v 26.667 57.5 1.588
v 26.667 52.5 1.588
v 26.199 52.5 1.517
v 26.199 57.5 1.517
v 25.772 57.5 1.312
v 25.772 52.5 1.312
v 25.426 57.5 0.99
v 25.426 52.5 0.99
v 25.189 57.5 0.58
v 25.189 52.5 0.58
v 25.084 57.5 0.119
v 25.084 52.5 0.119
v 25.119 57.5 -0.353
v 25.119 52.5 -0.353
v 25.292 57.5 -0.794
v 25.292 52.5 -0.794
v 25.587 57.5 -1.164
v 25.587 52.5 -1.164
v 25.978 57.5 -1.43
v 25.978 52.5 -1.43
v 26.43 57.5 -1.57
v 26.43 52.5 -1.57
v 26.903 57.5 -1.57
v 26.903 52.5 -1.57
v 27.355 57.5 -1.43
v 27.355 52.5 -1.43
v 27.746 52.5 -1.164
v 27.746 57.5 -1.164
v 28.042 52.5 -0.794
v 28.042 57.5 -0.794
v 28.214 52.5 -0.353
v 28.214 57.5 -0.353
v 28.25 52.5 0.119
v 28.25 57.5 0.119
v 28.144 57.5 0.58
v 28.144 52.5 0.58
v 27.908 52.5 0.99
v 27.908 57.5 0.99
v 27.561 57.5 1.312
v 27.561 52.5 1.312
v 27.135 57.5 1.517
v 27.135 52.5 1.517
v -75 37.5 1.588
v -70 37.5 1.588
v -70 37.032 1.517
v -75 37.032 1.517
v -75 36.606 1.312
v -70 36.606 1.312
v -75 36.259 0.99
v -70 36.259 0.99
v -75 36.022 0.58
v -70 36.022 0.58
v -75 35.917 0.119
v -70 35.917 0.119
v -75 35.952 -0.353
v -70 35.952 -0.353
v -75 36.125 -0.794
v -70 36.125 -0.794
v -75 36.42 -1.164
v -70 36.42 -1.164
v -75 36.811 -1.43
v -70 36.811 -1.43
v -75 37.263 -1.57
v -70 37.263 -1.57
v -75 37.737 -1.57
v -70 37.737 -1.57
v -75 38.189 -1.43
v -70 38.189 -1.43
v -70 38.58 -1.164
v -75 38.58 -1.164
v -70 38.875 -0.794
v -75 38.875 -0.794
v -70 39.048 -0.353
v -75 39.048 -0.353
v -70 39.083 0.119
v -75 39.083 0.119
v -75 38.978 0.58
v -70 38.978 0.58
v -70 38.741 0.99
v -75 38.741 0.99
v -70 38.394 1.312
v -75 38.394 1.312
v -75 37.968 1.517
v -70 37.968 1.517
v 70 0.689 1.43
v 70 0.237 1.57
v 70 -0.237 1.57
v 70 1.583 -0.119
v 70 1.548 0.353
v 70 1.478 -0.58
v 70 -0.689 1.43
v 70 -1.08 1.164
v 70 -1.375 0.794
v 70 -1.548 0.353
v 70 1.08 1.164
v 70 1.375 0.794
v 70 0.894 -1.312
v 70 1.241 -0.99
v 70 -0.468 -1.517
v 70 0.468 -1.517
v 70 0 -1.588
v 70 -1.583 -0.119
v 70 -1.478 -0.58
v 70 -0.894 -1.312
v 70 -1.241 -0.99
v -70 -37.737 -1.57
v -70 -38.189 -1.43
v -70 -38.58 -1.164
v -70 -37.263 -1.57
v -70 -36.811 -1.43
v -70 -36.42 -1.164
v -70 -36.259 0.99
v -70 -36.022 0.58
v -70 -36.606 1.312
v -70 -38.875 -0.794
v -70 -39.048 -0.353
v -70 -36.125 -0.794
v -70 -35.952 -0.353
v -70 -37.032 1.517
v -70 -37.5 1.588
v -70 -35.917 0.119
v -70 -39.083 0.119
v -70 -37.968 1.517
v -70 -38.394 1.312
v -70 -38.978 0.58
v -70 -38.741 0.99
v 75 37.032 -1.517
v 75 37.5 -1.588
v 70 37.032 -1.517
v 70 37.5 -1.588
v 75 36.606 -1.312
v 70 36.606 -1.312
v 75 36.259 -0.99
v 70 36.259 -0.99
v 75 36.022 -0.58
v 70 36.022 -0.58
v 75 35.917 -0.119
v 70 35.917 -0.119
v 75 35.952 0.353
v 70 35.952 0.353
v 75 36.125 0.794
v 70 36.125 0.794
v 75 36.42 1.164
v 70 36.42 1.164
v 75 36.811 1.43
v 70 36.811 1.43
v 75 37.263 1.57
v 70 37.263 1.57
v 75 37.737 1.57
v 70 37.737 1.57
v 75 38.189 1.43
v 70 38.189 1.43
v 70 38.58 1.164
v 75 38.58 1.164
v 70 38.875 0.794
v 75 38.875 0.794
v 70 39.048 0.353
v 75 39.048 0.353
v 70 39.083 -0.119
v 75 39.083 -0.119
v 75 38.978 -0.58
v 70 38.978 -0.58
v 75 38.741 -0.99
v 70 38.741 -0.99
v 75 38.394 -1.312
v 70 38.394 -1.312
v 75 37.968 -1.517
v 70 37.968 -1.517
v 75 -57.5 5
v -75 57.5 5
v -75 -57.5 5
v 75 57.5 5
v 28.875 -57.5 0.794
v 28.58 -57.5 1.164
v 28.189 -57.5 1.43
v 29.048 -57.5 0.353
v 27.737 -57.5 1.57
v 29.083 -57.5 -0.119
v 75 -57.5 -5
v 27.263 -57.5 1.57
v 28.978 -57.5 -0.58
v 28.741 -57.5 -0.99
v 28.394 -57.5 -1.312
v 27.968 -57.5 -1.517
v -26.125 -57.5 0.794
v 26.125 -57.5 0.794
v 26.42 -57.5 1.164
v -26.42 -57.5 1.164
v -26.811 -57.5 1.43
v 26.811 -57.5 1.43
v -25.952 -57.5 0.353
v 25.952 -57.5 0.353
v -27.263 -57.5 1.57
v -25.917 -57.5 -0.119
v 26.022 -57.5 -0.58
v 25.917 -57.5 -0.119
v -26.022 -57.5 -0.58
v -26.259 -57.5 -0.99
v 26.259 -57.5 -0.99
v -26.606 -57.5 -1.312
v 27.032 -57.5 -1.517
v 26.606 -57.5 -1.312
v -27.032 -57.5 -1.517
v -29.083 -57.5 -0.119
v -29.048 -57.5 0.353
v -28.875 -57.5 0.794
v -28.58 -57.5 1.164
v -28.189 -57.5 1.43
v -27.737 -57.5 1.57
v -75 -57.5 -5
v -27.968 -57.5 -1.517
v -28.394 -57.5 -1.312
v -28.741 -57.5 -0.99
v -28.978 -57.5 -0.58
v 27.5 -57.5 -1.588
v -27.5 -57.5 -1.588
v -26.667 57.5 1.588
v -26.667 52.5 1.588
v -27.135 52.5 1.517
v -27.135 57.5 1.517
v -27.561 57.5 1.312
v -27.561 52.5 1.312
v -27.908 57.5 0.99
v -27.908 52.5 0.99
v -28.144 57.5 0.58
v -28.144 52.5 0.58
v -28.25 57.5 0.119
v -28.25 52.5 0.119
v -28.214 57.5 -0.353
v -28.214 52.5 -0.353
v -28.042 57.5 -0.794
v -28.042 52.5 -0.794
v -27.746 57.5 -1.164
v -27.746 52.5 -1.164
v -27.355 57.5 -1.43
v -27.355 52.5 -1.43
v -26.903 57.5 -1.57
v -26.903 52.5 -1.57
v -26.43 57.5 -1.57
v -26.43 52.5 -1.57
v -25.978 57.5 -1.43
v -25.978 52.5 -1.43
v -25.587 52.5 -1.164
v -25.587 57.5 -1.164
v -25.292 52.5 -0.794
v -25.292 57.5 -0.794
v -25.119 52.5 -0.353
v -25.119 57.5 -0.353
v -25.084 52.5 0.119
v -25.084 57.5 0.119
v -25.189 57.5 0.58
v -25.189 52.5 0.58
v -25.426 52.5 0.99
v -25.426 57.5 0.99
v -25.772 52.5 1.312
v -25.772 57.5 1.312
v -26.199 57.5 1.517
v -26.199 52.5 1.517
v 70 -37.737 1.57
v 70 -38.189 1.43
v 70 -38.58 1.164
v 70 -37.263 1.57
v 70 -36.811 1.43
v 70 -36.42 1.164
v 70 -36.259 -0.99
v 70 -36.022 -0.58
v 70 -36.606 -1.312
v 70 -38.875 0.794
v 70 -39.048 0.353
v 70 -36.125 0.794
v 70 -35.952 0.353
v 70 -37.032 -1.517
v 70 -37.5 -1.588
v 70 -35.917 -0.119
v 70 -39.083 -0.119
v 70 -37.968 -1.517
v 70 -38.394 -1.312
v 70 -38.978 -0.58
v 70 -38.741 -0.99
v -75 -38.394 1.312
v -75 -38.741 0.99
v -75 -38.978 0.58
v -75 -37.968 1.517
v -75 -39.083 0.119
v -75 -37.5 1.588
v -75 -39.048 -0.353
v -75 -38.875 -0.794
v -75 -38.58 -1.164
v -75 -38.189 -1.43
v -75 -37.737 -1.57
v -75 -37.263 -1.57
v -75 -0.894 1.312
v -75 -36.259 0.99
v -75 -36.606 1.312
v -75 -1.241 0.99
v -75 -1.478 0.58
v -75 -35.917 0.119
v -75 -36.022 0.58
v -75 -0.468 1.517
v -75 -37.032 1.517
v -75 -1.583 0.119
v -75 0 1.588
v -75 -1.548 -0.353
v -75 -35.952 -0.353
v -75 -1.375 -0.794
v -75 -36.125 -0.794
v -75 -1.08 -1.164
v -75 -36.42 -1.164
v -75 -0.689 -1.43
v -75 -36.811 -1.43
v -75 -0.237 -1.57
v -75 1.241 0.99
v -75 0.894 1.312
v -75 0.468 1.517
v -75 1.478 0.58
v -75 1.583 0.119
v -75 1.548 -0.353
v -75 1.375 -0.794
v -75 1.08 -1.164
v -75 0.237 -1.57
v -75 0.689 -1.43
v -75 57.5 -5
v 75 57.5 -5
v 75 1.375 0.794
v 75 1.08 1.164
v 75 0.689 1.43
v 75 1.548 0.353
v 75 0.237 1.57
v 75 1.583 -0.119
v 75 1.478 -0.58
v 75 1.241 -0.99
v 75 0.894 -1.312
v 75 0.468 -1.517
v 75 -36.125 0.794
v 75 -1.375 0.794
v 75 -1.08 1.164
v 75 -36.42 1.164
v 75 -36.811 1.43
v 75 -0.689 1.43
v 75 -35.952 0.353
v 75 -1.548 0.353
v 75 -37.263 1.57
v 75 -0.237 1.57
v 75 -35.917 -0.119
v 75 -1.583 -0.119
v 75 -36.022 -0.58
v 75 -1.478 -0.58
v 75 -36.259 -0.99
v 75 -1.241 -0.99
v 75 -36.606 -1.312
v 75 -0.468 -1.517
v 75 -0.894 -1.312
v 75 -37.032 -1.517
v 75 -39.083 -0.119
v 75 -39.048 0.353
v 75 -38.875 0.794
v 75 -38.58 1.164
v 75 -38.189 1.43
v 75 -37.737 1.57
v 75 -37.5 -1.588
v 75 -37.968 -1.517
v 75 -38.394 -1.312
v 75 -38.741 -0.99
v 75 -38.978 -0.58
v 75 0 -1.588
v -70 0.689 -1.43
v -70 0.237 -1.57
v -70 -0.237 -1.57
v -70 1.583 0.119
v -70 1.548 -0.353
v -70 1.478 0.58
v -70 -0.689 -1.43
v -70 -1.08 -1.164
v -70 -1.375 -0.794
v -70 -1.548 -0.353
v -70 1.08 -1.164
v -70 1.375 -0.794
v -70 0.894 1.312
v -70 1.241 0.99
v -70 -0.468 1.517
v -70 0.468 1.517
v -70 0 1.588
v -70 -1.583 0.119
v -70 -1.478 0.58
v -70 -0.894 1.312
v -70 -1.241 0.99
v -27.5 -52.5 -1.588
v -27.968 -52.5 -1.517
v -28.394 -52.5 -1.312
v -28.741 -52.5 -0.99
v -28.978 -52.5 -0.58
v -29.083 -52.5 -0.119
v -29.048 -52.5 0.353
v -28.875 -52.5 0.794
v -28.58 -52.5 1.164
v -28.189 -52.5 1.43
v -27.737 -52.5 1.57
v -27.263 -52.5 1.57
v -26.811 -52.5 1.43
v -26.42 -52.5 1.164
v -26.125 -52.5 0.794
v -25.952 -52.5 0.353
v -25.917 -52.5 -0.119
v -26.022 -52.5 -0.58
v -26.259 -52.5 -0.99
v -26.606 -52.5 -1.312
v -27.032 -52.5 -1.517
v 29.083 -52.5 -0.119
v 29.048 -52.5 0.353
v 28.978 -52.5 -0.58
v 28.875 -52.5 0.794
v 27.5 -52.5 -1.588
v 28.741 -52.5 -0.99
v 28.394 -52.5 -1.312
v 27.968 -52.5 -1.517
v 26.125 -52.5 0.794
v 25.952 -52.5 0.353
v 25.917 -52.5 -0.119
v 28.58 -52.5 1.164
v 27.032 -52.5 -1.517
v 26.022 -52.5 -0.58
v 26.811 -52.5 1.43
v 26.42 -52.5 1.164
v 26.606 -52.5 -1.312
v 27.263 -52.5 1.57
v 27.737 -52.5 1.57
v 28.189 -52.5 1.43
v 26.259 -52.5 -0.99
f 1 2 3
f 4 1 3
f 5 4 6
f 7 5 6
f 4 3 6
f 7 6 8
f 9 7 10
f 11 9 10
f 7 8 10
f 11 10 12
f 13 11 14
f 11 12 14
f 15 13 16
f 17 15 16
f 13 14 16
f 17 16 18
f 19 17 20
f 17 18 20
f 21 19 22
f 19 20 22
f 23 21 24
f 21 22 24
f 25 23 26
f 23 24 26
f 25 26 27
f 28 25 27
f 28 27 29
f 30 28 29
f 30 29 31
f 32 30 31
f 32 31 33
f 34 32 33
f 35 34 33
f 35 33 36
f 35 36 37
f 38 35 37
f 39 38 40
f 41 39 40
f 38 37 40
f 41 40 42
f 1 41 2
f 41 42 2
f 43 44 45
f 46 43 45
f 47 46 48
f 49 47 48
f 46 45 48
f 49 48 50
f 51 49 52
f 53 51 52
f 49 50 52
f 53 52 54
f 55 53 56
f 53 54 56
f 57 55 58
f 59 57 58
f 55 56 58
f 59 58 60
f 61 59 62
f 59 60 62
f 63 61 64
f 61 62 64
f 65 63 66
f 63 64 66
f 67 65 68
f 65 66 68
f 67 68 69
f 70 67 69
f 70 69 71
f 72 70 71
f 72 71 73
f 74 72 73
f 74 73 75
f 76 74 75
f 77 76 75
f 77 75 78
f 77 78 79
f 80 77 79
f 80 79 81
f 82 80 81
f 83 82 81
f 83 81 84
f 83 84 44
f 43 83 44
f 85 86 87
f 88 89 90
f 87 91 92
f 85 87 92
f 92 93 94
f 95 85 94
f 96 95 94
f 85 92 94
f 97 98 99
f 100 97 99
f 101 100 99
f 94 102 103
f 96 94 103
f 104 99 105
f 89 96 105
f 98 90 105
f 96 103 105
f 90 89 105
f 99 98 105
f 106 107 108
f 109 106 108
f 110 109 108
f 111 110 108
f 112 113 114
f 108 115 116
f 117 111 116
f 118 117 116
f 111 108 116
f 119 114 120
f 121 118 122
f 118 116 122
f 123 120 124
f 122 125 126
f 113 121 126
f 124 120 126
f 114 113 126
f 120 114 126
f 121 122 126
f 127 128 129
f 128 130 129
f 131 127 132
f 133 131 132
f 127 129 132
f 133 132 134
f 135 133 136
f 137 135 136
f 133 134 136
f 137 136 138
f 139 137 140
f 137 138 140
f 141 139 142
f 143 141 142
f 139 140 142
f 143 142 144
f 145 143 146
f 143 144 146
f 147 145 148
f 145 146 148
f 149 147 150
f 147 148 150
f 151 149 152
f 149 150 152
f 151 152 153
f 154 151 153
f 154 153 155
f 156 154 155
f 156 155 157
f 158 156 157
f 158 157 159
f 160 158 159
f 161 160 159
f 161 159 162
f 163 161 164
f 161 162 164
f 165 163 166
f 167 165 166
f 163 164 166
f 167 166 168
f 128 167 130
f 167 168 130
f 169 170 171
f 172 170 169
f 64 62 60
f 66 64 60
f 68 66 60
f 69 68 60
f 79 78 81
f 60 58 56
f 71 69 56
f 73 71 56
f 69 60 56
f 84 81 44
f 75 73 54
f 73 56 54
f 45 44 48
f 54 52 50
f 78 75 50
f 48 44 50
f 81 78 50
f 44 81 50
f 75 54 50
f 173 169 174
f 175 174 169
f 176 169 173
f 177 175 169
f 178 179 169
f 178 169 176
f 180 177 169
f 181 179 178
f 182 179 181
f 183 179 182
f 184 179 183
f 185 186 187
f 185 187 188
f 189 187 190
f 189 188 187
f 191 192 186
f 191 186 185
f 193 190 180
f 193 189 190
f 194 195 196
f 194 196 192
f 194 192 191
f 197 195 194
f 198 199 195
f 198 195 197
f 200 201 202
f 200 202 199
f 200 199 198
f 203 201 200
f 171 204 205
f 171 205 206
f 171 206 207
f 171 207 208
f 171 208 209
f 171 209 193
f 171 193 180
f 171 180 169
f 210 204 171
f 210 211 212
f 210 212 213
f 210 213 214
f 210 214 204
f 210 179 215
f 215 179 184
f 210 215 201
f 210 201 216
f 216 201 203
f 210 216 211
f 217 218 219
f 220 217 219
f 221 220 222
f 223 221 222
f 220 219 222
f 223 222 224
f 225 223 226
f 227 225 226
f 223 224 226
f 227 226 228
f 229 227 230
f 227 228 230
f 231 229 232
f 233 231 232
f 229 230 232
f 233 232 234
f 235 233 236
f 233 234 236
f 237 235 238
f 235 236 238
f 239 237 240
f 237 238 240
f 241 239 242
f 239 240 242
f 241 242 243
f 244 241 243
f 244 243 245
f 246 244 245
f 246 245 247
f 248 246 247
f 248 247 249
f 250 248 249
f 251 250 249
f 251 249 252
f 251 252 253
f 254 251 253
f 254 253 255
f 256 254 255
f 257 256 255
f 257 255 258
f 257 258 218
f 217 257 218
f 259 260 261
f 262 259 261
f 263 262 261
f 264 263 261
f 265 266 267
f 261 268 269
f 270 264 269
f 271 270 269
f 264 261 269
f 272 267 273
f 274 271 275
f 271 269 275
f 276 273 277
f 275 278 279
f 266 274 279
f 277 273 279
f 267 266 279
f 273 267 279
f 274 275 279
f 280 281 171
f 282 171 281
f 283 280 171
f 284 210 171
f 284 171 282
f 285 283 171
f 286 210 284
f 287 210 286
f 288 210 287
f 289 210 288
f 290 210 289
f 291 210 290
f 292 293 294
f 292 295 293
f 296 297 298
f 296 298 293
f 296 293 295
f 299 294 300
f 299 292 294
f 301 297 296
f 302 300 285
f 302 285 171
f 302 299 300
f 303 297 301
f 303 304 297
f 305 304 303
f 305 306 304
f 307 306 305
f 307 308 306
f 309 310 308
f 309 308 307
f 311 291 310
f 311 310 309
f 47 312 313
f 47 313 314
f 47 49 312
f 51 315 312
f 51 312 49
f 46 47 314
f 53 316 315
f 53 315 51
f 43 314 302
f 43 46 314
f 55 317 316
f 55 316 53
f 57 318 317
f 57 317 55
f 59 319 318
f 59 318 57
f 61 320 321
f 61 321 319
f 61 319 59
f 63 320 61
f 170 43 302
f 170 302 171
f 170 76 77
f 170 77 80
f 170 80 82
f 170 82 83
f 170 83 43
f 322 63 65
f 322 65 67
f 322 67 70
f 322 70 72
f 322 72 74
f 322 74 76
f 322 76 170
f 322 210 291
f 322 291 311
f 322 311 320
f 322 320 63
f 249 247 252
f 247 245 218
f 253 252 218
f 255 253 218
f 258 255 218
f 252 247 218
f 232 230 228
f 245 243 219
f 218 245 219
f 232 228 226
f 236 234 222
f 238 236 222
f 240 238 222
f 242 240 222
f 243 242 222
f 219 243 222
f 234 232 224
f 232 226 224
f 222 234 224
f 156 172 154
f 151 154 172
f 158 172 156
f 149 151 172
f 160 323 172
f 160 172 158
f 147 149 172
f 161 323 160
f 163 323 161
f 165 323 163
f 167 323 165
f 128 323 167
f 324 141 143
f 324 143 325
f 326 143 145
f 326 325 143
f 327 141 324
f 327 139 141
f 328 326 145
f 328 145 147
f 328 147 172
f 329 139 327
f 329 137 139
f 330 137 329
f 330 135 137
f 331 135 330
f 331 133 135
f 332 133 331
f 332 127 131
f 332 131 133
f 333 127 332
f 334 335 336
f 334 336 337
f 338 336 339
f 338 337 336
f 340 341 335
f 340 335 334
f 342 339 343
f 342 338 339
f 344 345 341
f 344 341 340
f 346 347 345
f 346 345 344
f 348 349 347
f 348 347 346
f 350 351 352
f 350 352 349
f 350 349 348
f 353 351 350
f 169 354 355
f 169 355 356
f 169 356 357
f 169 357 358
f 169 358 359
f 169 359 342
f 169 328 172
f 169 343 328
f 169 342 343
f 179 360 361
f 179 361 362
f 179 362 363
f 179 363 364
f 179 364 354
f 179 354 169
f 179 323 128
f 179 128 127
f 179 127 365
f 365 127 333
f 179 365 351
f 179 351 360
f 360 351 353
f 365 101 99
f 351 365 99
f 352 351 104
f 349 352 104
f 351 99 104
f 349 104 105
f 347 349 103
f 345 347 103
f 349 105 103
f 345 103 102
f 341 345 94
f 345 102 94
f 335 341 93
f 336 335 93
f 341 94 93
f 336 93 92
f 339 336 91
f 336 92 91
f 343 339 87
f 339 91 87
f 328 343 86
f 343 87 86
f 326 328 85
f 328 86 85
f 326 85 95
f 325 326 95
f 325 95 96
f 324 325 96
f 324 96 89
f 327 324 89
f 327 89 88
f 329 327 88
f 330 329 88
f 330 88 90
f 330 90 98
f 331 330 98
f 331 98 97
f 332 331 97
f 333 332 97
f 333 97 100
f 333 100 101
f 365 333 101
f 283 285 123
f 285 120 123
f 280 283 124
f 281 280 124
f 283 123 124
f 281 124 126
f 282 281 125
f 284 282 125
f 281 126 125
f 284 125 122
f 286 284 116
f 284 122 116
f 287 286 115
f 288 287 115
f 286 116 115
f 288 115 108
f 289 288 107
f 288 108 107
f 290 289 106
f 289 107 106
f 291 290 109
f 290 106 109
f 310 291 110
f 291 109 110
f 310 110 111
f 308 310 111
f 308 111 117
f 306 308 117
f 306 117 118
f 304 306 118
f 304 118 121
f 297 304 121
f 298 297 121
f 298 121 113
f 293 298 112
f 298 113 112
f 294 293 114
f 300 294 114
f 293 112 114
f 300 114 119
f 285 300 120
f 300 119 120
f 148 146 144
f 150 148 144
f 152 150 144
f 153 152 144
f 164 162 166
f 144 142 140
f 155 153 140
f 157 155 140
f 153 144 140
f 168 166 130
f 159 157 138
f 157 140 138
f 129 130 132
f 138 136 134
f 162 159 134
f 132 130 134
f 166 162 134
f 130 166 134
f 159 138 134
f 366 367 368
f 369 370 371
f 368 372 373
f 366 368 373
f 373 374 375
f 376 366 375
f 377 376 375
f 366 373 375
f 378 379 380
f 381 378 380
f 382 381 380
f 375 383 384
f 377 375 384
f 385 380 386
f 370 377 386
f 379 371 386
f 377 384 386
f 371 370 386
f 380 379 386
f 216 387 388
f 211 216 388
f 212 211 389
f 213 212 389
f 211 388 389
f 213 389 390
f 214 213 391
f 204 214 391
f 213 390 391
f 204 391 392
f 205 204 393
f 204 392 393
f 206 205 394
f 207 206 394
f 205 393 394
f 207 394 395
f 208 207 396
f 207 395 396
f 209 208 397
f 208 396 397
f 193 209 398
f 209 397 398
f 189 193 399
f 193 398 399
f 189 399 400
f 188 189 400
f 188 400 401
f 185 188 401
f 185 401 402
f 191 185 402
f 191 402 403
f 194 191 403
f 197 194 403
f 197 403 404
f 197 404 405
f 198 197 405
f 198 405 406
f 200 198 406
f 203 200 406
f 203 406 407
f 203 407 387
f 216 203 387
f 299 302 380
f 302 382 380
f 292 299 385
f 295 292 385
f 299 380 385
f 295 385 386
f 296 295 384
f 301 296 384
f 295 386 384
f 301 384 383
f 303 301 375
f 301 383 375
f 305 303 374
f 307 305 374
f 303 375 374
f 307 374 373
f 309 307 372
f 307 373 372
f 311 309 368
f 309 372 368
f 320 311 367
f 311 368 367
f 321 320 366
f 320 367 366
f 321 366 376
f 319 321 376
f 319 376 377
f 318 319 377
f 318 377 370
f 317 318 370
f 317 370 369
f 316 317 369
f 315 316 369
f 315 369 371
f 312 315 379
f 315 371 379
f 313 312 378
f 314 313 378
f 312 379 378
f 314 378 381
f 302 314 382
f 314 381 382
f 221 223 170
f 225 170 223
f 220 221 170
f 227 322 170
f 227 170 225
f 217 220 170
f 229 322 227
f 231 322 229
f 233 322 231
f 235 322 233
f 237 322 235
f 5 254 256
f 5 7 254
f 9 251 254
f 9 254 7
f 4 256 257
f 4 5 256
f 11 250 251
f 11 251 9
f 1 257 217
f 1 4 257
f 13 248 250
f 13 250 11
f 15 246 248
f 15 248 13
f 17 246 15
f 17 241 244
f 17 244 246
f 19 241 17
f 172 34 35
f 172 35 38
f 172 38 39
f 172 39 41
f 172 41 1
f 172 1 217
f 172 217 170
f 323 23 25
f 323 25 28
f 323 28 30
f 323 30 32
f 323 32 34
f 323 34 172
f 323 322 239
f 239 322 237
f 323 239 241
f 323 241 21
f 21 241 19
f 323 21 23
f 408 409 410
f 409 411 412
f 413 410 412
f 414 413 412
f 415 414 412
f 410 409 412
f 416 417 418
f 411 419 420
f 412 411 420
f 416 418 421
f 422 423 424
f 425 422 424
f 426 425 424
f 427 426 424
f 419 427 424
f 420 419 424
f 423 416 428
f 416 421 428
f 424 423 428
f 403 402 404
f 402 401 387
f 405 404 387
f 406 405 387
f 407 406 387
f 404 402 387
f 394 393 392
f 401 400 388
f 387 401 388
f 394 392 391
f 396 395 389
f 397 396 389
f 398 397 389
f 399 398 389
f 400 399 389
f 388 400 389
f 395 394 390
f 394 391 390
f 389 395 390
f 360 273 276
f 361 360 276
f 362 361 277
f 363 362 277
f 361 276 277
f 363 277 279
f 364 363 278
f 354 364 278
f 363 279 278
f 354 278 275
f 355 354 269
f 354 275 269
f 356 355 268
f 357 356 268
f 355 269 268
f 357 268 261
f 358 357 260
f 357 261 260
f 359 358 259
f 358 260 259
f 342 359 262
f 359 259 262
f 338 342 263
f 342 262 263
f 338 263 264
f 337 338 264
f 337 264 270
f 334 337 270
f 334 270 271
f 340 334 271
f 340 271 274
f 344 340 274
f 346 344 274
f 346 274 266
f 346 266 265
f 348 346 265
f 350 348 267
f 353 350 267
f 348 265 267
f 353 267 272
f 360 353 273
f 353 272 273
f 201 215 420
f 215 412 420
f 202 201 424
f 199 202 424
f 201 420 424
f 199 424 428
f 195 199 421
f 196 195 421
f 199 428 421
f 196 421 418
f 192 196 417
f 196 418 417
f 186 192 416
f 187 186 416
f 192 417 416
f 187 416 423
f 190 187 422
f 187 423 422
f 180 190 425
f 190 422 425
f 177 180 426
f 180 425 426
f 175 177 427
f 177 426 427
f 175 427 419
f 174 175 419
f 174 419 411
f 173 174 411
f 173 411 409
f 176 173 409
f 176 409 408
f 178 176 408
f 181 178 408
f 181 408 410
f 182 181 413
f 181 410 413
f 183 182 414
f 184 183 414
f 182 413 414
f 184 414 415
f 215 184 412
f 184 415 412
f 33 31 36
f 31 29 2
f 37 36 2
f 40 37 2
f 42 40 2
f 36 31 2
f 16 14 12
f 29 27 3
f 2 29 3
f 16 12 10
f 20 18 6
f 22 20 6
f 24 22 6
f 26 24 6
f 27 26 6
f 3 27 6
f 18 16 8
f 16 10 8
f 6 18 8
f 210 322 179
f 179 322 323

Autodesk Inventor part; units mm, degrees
ref_plane "YZ Plane" through (0, 0, 0) normal (1, 0, 0) x (0, 1, 0)
ref_plane "XZ Plane" through (0, 0, 0) normal (0, 1, 0) x (-1, 0, 0)
ref_plane "XY Plane" through (0, 0, 0) normal (0, 0, 1) x (1, 0, 0)
sketch "Sketch1" plane through (0, 0, 0) normal (0, 0, 1) x (1, 0, 0)
  line L0 (-75, 57.5) -> (75, 57.5)
  line L1 (75, 57.5) -> (75, -57.5)
  line L2 (75, -57.5) -> (-75, -57.5)
  line L3 (-75, -57.5) -> (-75, 57.5)
  line L4 (-75, 57.5) -> (75, -57.5) construction
  line L5 (75, 57.5) -> (-75, -57.5) construction
  point P0 (0, 0)
  dimension "d0" = 150
  dimension "d1" = 115
extrude "Extrusion1" add sketch "Sketch1" along normal mid plane 10
sketch "Sketch2" plane through (75, -57.5, 5) normal (1, 0, 0) x (0, 0, -1)
  line L0 (10, 0) -> (0, 0) projected
  line L1 (0, 0) -> (0, 115) projected
  point P0 (5, 57.5)
  point P1 (5, 20)
  point P2 (5, 57.5)
  point P3 (5, 95)
  dimension "d4" = 20
  dimension "d5" = 5
  dimension "d8" = 37.5
hole "Hole1" at (75, -37.5, 0) at (75, 0, 0) at (75, 37.5, 0) direction (-1, 0, 0) diameter 3.175 depth 5
sketch "Sketch3" plane through (-75, 57.5, 5) normal (0, 1, 0) x (1, 0, 0)
  line L0 (150, 10) -> (150, 0) projected
  line L1 (0, 10) -> (150, 10) projected
  point P0 (75, 5)
  point P1 (101.6667, 5)
  point P2 (48.3333, 5)
  dimension "d21" = 5
  dimension "d24" = 53.3333
  dimension "d69" = 26.6667
hole "Hole2" at (26.6667, 57.5, 0) at (-26.6667, 57.5, 0) direction (0, -1, 0) diameter 3.175 depth 5
sketch "Sketch4" plane through (-75, -57.5, 5) normal (0, -1, 0) x (1, 0, 0)
  line L0 (150, -10) -> (150, 0) projected
  line L1 (0, 0) -> (150, 0) projected
  point P0 (75, -5)
  point P1 (102.5, -5)
  point P2 (47.5, -5)
  dimension "d37" = 5
  dimension "d40" = 55
  dimension "d68" = 27.5
hole "Hole3" at (27.5, -57.5, 0) at (-27.5, -57.5, 0) direction (0, 1, 0) diameter 3.175 depth 5
sketch "Sketch5" plane through (-75, -57.5, 5) normal (-1, 0, 0) x (0, 0, 1)
  line L0 (0, 0) -> (-10, 0) projected
  line L1 (-10, 0) -> (-10, 115) projected
  point P0 (-5, 57.5)
  point P1 (-5, 20)
  point P2 (-5, 57.5)
  point P3 (-5, 95)
  dimension "d52" = 20
  dimension "d53" = 5
  dimension "d56" = 37.5
hole "Hole4" at (-75, -37.5, 0) at (-75, 0, 0) at (-75, 37.5, 0) direction (1, 0, 0) diameter 3.175 depth 5
equation "\"d69\" = 0.5 * d24"
properties part number "front"
